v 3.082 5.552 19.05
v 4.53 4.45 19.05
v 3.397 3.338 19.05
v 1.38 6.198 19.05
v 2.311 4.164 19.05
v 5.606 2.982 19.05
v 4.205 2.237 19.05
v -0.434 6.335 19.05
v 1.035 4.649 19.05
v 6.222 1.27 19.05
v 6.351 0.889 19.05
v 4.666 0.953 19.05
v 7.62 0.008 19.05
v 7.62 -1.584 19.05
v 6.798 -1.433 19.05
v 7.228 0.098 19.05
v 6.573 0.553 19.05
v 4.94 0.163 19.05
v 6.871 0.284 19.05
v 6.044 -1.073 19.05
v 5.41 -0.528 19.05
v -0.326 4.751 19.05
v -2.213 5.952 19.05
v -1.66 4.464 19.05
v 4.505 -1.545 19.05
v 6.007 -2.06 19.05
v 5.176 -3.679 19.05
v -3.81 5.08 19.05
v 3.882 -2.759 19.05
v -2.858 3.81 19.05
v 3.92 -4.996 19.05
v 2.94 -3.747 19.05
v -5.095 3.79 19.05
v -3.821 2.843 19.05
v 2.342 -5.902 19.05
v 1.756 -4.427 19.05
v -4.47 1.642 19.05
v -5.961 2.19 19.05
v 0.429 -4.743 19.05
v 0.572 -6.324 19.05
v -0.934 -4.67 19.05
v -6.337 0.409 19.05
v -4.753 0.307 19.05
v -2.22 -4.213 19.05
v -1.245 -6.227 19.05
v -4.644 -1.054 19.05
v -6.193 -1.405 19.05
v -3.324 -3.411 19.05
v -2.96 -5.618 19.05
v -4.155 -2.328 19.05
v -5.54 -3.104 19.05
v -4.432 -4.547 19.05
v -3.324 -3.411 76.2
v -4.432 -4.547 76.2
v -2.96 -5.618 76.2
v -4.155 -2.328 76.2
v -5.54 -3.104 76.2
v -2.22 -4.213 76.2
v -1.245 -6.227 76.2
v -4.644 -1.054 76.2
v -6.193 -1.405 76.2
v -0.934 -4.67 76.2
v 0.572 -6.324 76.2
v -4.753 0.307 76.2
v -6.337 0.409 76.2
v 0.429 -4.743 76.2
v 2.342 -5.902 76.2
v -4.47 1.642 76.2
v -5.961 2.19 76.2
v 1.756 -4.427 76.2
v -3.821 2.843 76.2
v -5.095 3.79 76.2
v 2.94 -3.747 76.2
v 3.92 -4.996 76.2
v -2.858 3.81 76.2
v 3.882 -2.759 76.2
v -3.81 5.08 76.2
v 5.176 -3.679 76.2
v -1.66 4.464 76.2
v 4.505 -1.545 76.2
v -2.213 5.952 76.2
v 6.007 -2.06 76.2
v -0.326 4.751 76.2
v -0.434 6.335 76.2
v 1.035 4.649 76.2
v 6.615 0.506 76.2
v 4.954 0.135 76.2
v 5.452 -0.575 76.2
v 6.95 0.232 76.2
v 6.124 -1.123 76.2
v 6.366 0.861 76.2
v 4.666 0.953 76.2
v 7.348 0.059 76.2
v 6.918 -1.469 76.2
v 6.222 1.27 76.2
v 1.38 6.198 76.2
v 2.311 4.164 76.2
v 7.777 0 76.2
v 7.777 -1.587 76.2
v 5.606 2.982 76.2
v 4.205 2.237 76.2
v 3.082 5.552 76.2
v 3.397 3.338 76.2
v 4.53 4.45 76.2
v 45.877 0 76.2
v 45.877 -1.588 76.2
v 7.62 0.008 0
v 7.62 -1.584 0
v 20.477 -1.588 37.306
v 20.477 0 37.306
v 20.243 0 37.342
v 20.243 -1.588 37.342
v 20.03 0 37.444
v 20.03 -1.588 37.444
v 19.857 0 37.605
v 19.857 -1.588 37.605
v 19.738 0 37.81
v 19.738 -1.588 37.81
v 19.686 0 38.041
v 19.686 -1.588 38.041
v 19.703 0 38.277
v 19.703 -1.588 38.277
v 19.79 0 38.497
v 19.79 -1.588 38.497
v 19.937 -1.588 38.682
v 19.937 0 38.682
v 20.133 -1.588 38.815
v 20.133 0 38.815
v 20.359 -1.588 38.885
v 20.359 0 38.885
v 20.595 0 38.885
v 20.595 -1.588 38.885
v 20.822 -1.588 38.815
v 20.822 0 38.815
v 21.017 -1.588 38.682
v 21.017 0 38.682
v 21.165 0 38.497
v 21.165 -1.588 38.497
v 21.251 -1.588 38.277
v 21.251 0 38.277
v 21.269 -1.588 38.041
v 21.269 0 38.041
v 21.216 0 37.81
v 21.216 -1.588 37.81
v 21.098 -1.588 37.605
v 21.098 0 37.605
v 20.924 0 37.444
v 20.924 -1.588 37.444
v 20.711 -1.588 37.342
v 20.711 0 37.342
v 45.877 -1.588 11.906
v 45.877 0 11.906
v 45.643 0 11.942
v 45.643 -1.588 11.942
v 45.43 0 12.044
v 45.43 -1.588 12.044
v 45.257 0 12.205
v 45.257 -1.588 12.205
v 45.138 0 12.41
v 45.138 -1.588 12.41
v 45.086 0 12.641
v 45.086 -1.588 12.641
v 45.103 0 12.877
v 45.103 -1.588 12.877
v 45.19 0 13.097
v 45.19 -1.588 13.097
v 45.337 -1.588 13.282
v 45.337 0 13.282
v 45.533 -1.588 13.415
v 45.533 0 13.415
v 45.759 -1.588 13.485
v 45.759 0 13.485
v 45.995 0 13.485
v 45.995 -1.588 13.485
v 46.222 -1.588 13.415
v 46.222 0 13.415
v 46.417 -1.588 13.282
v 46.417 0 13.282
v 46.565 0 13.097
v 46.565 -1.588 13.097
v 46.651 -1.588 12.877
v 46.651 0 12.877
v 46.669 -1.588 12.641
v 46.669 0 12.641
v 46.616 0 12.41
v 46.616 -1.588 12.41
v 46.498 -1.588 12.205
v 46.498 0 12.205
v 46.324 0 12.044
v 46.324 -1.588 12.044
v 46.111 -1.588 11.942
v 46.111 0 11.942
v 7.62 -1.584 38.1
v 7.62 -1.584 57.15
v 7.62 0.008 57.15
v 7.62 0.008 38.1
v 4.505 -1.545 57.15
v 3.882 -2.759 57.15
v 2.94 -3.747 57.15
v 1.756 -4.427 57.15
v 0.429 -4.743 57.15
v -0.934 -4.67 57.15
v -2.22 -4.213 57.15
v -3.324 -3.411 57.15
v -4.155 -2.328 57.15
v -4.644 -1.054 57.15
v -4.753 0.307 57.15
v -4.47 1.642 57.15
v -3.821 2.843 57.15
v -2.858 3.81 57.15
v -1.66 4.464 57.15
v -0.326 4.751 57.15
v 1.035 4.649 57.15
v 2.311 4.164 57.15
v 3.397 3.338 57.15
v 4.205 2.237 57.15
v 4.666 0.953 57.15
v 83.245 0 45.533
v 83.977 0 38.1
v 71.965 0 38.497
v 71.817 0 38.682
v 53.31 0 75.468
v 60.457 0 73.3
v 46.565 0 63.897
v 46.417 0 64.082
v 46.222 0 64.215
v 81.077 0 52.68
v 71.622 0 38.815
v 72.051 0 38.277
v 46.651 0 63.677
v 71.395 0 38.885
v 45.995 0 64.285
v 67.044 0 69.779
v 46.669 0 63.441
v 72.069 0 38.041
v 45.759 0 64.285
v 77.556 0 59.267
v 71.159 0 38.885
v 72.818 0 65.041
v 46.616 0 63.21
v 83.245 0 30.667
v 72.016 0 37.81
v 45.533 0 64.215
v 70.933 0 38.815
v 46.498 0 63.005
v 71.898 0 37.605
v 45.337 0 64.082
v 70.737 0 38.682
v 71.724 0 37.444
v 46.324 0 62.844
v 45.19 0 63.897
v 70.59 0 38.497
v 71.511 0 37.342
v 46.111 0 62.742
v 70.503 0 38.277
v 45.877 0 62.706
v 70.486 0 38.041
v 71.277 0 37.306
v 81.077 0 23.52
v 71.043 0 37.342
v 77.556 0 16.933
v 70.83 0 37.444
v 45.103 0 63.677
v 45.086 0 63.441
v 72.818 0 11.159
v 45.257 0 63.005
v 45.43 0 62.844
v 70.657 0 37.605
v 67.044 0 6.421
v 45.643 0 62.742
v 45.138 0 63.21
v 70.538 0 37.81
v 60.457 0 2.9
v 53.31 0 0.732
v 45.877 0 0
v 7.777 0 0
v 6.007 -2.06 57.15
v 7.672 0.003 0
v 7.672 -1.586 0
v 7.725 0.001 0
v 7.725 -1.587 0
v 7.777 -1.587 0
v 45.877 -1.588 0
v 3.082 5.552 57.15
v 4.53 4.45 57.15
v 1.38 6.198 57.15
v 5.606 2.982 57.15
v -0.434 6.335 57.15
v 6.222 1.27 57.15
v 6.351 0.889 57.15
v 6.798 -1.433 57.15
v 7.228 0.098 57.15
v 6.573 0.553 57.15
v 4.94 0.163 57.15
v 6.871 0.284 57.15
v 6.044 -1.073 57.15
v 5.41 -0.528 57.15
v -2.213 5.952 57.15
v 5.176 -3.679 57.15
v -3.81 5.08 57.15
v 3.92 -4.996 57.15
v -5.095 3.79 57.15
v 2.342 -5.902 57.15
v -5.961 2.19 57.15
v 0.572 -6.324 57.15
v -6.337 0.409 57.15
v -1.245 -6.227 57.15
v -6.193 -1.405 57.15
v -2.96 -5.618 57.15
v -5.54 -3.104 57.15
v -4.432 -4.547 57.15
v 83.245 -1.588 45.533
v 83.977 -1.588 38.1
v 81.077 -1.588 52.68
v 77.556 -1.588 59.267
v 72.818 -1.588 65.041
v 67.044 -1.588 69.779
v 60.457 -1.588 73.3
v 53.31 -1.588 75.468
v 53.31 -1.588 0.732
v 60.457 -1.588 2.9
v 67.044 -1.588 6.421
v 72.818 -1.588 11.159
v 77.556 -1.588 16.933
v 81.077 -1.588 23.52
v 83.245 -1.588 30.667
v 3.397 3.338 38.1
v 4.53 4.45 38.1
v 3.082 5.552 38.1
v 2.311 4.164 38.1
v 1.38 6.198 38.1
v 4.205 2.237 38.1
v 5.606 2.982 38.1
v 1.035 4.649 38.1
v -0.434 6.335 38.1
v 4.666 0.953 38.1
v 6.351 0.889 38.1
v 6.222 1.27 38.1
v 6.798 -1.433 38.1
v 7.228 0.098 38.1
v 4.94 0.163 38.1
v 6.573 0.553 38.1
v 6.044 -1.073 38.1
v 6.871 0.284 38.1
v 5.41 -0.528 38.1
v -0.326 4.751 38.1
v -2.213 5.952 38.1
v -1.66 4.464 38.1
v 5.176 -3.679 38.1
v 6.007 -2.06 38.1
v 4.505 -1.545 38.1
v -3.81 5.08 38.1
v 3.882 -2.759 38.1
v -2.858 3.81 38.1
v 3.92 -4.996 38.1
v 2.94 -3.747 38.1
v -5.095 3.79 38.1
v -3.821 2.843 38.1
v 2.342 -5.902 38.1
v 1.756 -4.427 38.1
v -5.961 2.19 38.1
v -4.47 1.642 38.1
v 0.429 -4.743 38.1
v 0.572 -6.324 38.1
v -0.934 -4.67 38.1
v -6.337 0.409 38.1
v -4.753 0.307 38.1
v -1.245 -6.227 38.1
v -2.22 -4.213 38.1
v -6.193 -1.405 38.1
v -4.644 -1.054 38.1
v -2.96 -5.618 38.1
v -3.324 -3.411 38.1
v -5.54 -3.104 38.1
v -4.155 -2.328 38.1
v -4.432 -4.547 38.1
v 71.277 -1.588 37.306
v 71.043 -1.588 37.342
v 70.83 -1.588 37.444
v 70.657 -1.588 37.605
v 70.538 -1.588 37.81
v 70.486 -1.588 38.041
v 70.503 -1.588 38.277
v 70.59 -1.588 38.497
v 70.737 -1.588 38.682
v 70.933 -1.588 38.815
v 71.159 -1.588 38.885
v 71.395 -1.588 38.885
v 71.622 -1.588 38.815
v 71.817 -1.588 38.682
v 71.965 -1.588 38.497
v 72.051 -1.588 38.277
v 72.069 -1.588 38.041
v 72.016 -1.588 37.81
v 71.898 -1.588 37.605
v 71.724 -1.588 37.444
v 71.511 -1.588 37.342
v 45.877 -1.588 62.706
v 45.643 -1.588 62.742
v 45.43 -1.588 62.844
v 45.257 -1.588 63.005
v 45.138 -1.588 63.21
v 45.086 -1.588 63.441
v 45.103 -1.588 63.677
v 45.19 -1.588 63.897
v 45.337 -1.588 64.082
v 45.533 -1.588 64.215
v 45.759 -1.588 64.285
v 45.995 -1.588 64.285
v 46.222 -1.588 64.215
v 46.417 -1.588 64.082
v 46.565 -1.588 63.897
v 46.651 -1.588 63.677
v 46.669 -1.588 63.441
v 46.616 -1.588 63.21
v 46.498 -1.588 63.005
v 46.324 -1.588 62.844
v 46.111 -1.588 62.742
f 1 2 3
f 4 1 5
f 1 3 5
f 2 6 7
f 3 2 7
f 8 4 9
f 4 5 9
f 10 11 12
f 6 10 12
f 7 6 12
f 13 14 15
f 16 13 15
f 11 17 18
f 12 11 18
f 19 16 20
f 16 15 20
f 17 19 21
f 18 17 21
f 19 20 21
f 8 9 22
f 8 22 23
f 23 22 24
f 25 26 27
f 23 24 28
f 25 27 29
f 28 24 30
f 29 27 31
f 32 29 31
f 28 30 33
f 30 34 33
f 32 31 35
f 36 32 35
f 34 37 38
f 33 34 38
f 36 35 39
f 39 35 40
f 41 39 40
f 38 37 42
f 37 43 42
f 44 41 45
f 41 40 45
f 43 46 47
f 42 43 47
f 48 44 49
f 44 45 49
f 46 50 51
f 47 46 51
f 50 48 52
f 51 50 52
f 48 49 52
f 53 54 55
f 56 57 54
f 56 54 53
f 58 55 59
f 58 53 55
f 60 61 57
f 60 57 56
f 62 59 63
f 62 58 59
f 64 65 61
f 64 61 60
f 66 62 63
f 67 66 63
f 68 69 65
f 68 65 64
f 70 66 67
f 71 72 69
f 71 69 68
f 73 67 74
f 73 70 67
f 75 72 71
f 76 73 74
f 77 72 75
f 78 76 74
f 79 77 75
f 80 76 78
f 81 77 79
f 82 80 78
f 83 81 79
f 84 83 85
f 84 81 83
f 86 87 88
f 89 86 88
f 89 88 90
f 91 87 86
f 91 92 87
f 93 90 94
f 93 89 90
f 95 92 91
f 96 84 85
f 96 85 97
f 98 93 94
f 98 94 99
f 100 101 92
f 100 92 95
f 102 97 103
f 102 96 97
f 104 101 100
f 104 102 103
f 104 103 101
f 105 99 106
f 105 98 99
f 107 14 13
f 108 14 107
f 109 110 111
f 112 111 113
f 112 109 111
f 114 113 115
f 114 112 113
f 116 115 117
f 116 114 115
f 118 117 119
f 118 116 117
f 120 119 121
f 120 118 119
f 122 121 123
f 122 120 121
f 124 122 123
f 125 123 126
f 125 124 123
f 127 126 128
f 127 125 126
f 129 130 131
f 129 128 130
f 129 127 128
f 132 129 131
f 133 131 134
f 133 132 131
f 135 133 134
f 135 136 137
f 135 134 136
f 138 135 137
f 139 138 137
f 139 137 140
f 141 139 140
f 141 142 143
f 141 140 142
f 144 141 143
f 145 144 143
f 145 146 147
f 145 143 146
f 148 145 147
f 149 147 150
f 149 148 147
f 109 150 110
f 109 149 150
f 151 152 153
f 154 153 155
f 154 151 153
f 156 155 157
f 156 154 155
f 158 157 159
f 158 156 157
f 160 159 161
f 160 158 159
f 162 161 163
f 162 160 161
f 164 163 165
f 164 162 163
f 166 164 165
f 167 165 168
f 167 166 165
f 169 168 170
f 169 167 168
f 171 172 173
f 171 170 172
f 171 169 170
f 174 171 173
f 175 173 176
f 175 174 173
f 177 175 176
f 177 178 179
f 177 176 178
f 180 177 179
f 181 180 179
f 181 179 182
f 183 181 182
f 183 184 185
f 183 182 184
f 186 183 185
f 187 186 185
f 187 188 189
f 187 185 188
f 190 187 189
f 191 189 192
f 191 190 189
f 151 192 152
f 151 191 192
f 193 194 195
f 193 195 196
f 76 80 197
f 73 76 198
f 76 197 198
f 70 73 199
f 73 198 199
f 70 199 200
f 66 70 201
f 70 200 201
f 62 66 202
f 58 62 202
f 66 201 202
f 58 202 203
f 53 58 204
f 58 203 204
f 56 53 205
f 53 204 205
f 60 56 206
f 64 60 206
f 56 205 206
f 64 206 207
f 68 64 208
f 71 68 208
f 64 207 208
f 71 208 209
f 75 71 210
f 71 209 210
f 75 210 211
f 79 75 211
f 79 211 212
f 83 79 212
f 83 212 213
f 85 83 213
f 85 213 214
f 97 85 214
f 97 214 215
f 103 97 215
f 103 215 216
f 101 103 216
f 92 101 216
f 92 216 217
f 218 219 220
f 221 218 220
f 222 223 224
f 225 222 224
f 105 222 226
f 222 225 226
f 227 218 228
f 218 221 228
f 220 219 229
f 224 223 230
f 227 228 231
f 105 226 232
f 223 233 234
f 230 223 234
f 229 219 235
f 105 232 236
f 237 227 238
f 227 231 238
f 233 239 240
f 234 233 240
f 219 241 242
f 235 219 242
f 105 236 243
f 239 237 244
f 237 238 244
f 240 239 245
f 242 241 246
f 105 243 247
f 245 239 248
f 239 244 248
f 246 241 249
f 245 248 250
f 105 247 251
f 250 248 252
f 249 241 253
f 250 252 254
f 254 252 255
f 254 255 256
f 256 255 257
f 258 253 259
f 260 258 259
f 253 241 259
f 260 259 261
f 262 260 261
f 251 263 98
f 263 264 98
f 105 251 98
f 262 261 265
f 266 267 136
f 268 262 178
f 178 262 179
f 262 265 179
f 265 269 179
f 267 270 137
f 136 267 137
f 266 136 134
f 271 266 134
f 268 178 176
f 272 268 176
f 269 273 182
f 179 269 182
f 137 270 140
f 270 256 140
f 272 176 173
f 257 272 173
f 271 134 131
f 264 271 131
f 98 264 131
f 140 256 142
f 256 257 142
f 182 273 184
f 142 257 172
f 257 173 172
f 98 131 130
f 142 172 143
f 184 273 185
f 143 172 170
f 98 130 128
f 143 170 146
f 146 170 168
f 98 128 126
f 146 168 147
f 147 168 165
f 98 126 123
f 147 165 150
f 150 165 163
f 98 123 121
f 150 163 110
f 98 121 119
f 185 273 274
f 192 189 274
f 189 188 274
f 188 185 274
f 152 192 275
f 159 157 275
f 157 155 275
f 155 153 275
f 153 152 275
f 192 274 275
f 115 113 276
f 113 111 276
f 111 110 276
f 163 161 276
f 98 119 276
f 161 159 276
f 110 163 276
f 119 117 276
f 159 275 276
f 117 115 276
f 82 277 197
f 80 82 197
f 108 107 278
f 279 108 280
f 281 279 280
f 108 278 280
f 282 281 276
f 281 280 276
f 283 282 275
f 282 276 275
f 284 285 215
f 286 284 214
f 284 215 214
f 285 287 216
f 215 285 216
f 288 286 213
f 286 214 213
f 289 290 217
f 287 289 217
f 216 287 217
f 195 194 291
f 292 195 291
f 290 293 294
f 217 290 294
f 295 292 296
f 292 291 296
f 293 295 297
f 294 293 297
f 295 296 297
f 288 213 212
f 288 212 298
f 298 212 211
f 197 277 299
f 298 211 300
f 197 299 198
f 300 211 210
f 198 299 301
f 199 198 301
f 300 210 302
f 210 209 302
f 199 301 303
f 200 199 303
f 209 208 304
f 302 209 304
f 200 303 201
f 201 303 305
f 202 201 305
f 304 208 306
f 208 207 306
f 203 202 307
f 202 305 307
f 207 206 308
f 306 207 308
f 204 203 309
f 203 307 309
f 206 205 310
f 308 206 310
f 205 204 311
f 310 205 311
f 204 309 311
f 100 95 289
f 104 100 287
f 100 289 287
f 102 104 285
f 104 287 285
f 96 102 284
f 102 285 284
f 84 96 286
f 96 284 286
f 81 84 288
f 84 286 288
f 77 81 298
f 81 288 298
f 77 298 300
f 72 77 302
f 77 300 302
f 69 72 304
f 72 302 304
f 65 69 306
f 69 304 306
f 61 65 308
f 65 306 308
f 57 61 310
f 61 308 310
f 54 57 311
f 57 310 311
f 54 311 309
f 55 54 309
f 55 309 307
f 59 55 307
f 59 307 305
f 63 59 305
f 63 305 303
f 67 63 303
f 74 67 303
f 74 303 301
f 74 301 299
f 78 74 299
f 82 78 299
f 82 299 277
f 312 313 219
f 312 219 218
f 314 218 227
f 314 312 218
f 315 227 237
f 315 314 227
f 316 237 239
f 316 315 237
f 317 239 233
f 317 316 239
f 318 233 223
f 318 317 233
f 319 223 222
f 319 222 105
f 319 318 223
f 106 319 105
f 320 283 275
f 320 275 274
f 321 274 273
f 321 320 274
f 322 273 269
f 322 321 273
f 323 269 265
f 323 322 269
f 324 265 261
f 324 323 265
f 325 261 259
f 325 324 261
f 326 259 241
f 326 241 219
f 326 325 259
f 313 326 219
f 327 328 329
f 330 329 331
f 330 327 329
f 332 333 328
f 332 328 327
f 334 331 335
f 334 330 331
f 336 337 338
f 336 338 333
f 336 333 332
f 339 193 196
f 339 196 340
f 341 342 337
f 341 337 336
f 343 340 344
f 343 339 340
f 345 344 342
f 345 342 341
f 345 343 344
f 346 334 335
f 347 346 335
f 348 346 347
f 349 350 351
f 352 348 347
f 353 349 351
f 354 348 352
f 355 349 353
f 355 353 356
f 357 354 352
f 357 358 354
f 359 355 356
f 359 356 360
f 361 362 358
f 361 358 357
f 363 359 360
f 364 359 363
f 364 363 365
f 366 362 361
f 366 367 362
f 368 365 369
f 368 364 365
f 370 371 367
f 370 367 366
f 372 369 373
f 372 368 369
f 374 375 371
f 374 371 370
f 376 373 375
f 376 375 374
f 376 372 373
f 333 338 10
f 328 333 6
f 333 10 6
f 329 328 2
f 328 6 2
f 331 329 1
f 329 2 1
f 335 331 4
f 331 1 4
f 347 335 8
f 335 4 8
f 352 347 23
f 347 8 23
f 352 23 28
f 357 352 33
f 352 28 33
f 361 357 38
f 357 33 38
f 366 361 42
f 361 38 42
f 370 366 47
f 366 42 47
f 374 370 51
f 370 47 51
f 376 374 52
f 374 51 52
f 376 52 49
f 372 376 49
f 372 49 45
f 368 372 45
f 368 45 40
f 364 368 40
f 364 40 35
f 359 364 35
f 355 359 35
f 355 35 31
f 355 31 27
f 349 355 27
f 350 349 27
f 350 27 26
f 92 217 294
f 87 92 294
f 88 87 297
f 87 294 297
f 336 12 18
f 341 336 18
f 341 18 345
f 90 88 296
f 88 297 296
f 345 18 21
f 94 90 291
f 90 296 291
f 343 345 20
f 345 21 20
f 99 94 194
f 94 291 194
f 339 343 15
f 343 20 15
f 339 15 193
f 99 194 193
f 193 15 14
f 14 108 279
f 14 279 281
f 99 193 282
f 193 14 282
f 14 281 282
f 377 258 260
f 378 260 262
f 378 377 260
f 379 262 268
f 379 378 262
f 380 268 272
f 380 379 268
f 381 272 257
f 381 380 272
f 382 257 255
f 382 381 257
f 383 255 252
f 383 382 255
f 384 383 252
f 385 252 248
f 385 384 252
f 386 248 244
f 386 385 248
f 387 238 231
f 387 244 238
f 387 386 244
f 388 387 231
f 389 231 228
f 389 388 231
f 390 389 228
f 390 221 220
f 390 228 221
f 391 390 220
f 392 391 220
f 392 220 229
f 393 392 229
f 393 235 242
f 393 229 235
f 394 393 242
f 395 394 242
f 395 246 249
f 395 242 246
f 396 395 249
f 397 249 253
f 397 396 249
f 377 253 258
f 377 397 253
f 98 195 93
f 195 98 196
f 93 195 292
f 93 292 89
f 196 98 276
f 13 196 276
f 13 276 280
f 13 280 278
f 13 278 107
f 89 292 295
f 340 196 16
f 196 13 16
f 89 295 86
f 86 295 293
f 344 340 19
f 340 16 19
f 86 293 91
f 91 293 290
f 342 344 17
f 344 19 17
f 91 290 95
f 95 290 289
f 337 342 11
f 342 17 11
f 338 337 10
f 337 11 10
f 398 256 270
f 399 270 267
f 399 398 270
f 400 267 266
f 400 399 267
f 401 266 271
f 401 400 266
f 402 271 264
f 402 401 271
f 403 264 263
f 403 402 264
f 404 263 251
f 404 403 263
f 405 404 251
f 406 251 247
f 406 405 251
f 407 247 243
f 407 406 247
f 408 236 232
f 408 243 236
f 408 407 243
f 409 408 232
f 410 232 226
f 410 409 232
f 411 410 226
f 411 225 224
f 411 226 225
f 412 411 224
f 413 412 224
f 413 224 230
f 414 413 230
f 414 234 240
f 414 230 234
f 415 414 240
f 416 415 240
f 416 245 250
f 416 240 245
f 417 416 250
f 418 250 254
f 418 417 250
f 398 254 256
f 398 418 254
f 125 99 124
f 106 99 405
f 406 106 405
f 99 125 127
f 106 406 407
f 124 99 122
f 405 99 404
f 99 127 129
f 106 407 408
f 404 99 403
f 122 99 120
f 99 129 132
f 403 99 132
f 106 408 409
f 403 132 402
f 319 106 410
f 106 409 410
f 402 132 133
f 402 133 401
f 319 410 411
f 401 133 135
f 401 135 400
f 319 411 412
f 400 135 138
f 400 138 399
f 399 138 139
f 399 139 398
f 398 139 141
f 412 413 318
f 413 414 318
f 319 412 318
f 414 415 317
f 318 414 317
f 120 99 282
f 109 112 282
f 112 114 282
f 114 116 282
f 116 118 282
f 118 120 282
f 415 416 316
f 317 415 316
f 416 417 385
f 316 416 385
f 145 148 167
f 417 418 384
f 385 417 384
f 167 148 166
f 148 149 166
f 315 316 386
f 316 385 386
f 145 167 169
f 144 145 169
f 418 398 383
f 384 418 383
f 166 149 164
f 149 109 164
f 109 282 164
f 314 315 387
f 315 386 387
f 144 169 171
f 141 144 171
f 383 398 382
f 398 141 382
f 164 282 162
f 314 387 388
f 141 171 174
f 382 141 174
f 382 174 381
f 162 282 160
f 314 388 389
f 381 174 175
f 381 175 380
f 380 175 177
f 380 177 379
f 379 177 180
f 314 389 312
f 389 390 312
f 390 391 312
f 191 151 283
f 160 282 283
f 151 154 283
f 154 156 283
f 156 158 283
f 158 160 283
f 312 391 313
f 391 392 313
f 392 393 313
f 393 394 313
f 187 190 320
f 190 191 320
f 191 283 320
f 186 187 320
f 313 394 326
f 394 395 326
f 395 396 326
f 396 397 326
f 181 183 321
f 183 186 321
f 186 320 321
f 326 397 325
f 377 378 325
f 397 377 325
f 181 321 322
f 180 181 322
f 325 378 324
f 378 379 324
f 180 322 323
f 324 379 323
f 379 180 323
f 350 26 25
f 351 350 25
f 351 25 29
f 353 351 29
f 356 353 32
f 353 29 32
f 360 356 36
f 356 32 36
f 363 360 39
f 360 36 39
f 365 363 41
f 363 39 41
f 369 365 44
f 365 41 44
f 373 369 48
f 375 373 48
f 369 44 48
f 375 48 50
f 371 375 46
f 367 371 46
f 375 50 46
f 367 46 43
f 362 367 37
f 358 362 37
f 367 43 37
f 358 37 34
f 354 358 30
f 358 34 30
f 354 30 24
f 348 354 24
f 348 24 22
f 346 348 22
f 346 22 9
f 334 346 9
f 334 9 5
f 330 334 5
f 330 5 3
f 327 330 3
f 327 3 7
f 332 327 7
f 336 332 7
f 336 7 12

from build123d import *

# Parameters (mm, degrees)
BOSS_EXTRUDE1_DEPTH     = 76.2
CUT_EXTRUDE1_DEPTH      = 109.055004078
CUT_EXTRUDE1_DEPTH_BACK = 109.055004078
SKETCH2_W               = 19.05
SKETCH2_H               = 13.97
SKETCH3_R               = 0.79375
CUT_EXTRUDE2_DEPTH      = 114.673225775


with BuildPart() as part:
    # Sketch1 → Boss-Extrude1 (new body)
    with BuildSketch(Plane.XY):
        with BuildLine():
            Line((6.006670832, -2.059710057), (4.505003124, -1.544782543))
            ThreePointArc((4.505003124, -1.544782543), (-4.752599731, 0.306923518), (4.66627796, 0.9525))
            ThreePointArc((4.66627796, 0.9525), (5.769083619, -0.871844425), (7.777129933, -1.5875))
            Line((7.777129933, -1.5875), (83.977129933, -1.5875))
            Line((83.977129933, -1.5875), (83.977129933, 0))
            Line((83.977129933, 0), (7.777129933, 0))
            ThreePointArc((7.777129933, 0), (6.773106776, 0.357827788), (6.221703947, 1.27))
            ThreePointArc((6.221703947, 1.27), (-6.336799641, 0.409231357), (6.006670832, -2.059710057))
        make_face()
    extrude(amount=BOSS_EXTRUDE1_DEPTH)

    # Sketch2 → Cut-Extrude1 (cut, two sides: drawn at the far end of the back side and taken through both)
    with BuildSketch(Plane(origin=(69.85, -1.5875, 0), x_dir=(0, 0, -1), z_dir=(0, 1, 0)).offset(-CUT_EXTRUDE1_DEPTH_BACK)):
        with Locations((-9.525, 69.215)):
            Rectangle(SKETCH2_W, SKETCH2_H)
        with Locations((-47.625, 69.215)):
            Rectangle(SKETCH2_W, SKETCH2_H)
    extrude(amount=CUT_EXTRUDE1_DEPTH + CUT_EXTRUDE1_DEPTH_BACK, mode=Mode.SUBTRACT)

    # Sketch3 → Cut-Extrude2 (cut, through all)
    with BuildSketch(Plane(origin=(0, -1.5875, 0), x_dir=(1, 0, 0), z_dir=(0, 1, 0))):
        with BuildLine():
            Line((83.977129933, 0), (45.877129933, 0))
            ThreePointArc((45.877129933, 0), (72.817898258, -11.159231598), (83.977129933, -38.09999989))
            Line((83.977129933, -38.09999989), (83.977129933, 0))
        make_face()
        with BuildLine():
            Line((83.977129933, -76.2), (83.977129933, -38.09999989))
            ThreePointArc((83.977129933, -38.09999989), (72.817898336, -65.040768324), (45.877129933, -76.2))
            Line((45.877129933, -76.2), (83.977129933, -76.2))
        make_face()
        with Locations(Location((45.877129933, -63.5, 0), (0, 0, 90))):
            Circle(SKETCH3_R)
        with Locations(Location((20.477129933, -38.1, 0), (0, 0, 90))):
            Circle(SKETCH3_R)
        with Locations(Location((71.277129933, -38.1, 0), (0, 0, 90))):
            Circle(SKETCH3_R)
        with Locations(Location((45.877129933, -12.7, 0), (0, 0, 90))):
            Circle(SKETCH3_R)
    extrude(amount=CUT_EXTRUDE2_DEPTH, mode=Mode.SUBTRACT)


solid = part.part
